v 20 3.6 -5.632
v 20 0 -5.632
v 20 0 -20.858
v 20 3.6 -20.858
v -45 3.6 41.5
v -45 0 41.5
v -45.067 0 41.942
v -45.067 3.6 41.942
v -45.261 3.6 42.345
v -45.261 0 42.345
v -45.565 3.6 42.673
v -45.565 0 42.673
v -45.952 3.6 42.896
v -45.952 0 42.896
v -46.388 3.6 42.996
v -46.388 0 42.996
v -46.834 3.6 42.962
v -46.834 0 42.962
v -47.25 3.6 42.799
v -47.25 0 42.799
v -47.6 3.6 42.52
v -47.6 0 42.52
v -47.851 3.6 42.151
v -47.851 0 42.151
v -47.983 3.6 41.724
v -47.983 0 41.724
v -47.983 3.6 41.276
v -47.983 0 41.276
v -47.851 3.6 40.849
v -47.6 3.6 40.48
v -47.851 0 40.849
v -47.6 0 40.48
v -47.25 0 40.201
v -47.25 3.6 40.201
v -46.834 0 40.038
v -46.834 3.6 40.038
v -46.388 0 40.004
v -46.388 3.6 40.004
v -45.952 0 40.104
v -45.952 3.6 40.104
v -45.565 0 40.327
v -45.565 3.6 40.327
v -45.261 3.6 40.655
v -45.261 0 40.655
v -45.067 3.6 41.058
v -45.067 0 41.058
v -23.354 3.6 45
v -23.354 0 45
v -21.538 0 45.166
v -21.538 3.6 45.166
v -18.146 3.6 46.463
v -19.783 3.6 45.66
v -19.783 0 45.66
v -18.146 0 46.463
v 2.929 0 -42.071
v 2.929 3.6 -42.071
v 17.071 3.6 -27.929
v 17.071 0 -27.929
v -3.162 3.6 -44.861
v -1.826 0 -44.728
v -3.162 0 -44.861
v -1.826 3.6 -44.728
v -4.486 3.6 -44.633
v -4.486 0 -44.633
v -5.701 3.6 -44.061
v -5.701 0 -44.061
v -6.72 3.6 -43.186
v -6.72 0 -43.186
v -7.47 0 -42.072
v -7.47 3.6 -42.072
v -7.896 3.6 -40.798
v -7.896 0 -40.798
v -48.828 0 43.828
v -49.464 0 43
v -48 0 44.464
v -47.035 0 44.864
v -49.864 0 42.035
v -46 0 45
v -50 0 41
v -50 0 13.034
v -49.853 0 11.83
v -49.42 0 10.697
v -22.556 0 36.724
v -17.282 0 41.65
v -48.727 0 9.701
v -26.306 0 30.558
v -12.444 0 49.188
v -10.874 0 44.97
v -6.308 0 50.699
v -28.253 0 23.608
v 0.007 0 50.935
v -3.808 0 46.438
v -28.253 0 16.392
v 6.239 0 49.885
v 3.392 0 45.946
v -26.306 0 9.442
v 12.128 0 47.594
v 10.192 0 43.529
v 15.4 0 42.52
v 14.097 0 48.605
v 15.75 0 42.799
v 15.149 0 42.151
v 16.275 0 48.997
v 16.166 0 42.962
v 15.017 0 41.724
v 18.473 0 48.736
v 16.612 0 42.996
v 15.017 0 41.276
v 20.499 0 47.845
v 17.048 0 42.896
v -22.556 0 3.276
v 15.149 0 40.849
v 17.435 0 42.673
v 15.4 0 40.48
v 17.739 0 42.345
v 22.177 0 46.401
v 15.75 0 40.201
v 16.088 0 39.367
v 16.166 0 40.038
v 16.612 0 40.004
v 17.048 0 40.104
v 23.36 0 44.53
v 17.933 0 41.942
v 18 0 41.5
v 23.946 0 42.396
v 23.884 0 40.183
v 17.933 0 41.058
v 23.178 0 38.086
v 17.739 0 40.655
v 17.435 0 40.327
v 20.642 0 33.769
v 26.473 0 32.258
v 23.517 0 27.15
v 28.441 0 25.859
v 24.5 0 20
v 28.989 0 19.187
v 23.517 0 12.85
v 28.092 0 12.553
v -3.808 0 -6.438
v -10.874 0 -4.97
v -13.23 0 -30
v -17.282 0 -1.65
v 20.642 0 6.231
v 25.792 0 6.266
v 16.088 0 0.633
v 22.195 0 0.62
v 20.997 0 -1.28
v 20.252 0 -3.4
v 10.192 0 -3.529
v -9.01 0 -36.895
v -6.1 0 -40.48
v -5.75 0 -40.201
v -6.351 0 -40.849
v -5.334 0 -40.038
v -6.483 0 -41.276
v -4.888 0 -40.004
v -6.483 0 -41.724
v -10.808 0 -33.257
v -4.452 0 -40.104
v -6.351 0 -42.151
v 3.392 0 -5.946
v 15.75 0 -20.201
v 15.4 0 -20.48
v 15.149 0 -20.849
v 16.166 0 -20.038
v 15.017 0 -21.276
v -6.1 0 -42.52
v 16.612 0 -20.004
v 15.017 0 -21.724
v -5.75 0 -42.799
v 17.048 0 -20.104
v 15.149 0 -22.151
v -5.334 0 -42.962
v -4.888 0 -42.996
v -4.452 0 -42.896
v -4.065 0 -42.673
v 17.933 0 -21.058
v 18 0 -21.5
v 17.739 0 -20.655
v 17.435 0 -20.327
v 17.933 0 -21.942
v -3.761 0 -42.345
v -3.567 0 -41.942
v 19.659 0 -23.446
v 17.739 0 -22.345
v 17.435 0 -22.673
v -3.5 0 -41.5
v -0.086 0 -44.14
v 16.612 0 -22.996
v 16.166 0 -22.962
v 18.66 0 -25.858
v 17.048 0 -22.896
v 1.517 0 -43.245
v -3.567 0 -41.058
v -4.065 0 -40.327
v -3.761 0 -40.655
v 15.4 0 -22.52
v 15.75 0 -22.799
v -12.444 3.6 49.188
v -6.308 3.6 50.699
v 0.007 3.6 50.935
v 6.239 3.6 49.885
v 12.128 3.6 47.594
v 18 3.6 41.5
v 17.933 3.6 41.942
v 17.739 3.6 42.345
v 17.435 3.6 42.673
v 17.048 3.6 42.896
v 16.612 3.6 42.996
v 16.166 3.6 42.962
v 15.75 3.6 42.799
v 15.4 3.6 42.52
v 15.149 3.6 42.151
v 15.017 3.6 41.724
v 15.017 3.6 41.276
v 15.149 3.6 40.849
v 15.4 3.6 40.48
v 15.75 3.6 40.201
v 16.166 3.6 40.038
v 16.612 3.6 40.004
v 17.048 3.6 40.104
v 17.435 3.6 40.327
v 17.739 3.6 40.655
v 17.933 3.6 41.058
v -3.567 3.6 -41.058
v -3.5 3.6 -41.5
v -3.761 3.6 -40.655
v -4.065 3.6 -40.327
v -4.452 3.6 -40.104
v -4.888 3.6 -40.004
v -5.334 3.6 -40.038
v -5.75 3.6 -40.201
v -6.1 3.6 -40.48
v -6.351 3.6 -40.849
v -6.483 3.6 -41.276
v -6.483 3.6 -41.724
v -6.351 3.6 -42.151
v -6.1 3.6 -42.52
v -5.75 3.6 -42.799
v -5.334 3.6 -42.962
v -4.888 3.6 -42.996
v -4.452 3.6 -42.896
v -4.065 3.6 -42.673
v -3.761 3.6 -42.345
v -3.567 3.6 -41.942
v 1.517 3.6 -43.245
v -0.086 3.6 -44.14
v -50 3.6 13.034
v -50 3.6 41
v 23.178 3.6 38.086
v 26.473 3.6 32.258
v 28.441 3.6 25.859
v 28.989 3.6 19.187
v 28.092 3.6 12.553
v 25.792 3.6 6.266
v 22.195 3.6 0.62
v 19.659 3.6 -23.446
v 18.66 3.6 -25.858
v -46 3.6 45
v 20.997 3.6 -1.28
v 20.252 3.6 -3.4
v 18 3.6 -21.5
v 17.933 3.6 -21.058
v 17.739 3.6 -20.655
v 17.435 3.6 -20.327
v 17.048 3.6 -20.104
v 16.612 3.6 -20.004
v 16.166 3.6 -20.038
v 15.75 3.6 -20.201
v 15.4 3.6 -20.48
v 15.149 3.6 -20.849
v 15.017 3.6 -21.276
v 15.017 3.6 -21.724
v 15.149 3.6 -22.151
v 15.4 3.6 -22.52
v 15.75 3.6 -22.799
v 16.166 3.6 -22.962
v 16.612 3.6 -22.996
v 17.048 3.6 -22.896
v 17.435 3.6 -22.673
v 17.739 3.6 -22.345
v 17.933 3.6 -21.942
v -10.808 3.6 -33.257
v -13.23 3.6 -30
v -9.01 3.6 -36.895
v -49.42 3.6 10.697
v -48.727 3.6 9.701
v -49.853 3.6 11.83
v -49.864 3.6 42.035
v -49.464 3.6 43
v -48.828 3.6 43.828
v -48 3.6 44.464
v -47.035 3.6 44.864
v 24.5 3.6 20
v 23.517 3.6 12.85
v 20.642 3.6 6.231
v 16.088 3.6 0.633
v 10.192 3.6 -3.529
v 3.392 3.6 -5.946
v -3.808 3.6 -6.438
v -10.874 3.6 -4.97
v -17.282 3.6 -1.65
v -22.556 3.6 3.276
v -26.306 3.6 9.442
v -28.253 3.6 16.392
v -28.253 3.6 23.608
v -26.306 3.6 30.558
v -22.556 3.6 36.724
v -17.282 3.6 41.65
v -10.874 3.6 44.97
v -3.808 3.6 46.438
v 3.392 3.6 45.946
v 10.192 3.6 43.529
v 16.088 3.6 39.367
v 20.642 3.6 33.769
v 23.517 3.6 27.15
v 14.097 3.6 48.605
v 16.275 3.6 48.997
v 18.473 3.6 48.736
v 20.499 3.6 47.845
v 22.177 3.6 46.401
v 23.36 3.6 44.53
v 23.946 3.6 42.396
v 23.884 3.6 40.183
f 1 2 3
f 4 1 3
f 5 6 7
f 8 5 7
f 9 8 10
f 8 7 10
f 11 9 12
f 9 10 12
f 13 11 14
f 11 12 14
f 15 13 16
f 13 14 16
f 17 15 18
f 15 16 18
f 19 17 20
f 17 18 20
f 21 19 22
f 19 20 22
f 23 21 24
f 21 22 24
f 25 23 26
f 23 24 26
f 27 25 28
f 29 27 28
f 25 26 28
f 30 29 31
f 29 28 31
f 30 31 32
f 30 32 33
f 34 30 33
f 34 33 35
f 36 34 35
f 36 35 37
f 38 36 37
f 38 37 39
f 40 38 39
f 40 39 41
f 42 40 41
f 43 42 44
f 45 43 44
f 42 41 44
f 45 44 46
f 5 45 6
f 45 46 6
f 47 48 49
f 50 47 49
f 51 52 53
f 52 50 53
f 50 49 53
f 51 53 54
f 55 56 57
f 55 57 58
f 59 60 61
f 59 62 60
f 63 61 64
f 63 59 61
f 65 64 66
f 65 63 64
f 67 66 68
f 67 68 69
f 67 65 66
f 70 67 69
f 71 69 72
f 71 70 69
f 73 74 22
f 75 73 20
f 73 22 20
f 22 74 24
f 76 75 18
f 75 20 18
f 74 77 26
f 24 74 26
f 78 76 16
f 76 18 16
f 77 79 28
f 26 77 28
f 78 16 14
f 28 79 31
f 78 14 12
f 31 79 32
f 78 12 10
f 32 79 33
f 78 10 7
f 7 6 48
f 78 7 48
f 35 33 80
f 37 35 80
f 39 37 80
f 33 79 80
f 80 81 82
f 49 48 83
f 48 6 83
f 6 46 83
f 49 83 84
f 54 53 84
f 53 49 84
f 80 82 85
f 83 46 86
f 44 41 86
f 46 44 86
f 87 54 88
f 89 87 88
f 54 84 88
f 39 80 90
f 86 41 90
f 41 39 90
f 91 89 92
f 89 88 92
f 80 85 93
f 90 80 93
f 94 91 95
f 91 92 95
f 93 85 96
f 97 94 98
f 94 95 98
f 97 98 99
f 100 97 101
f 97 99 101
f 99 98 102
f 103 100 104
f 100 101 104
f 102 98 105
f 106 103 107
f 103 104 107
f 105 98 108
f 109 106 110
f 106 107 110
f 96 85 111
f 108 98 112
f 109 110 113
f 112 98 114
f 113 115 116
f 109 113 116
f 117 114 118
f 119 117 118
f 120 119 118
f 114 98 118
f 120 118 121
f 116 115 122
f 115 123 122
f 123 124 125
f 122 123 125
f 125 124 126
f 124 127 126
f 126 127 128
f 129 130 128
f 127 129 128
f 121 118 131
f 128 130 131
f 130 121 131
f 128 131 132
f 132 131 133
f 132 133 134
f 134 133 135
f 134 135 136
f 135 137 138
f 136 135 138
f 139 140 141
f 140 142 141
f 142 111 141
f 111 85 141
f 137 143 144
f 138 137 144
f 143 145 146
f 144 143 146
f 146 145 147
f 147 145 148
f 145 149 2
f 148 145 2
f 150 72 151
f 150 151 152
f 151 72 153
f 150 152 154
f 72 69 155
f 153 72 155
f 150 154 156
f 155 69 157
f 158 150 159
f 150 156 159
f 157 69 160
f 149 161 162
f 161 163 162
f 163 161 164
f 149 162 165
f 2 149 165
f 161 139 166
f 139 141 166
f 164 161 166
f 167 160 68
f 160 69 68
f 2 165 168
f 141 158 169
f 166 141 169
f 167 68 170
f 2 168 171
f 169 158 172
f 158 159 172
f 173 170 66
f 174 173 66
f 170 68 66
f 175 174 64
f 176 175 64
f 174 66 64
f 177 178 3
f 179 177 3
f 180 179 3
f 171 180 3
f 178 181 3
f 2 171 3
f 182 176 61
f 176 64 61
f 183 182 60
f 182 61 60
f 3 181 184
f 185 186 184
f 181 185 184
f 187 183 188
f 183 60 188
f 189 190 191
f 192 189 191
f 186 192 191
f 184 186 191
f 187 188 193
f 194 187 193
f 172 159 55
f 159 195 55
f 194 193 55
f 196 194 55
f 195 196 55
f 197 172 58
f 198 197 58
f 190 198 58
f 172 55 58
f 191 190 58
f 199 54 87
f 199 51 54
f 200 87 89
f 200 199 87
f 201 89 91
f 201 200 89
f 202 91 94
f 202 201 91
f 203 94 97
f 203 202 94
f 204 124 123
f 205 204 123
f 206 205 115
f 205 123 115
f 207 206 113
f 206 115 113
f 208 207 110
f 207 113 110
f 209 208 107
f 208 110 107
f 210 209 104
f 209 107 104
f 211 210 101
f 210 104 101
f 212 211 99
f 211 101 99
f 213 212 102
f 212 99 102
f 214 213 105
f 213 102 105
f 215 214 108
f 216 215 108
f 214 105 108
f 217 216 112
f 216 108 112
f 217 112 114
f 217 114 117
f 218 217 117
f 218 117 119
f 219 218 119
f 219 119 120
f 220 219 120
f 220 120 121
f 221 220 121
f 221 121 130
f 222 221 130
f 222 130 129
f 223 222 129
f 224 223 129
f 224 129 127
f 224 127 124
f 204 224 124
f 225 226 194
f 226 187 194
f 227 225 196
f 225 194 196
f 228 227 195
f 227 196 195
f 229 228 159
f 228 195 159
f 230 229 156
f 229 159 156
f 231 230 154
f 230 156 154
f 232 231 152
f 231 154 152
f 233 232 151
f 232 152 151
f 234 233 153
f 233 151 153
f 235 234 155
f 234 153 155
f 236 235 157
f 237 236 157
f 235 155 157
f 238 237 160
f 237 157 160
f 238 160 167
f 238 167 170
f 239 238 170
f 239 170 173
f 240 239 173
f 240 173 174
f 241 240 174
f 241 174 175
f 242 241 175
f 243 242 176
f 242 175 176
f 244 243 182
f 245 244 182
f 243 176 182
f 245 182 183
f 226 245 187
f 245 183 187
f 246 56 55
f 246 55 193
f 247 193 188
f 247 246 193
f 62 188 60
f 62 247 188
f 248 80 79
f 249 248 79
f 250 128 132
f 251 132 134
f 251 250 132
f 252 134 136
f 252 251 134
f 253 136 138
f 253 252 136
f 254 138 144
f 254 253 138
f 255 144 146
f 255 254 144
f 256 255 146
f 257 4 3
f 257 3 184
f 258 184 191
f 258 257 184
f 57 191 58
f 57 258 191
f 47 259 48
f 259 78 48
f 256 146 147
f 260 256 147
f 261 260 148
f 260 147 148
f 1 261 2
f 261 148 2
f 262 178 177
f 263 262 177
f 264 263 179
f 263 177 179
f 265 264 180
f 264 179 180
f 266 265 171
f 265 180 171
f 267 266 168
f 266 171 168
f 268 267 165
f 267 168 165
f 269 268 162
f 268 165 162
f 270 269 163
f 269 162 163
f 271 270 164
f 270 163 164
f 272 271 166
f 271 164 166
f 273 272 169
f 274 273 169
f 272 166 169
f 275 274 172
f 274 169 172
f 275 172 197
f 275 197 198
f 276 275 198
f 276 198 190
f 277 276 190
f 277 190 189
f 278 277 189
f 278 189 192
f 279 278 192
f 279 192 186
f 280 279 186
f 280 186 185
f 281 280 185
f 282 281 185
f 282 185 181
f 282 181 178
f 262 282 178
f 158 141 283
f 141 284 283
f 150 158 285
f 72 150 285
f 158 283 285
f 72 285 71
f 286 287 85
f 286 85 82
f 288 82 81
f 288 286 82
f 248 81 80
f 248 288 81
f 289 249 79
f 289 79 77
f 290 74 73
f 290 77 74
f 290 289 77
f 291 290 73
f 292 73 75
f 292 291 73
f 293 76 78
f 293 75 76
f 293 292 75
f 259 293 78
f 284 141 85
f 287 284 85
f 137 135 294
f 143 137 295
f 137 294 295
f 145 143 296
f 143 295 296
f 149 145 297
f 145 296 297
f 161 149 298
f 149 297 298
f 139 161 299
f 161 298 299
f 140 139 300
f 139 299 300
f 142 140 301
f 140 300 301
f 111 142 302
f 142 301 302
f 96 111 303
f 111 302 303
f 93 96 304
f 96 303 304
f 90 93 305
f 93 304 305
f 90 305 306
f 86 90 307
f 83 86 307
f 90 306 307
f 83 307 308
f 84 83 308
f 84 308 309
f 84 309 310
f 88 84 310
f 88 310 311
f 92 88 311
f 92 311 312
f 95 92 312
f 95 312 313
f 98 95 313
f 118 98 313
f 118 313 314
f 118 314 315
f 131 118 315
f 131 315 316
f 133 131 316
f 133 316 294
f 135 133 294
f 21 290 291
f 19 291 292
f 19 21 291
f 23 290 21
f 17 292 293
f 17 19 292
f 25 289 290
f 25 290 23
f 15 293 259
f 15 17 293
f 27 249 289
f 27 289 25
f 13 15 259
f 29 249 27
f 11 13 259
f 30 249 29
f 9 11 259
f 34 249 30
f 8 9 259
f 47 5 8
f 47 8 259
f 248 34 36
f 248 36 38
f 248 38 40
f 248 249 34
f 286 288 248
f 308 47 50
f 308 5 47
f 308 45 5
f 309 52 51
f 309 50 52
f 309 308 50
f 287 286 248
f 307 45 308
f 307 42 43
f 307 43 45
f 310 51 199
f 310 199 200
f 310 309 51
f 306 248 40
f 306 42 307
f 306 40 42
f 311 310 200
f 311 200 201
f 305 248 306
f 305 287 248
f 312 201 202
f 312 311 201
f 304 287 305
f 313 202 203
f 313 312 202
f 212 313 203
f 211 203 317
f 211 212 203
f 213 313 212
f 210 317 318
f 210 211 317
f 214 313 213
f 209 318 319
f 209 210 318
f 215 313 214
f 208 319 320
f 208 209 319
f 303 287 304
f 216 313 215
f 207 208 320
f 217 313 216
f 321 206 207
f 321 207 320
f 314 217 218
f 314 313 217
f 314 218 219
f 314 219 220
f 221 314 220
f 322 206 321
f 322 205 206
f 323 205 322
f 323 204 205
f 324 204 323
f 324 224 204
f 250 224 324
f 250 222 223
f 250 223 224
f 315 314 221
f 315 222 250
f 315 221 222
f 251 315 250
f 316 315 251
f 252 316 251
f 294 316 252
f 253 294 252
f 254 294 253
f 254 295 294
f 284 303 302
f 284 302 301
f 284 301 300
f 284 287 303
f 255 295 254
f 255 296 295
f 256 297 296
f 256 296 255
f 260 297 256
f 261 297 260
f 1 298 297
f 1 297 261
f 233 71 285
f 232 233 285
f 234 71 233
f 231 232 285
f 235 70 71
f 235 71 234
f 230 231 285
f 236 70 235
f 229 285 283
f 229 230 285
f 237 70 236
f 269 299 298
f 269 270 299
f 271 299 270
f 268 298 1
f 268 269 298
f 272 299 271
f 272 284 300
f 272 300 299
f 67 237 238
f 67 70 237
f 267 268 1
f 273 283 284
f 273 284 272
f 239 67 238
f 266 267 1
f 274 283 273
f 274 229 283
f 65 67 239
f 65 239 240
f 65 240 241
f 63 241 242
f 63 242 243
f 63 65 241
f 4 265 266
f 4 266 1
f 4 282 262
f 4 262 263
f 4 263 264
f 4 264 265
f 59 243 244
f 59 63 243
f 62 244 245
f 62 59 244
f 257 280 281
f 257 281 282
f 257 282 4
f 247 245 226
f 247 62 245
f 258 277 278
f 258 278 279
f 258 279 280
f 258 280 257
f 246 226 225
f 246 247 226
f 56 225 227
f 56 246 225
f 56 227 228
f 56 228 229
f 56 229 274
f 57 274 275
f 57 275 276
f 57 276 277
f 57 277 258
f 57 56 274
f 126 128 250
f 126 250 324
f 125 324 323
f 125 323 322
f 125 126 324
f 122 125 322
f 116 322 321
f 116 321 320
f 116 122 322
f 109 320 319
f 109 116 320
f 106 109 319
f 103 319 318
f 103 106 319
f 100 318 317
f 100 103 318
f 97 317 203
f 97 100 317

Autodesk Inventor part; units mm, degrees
ref_plane "YZ Plane" through (0, 0, 0) normal (1, 0, 0) x (0, 1, 0)
ref_plane "XZ Plane" through (0, 0, 0) normal (0, 1, 0) x (-1, 0, 0)
ref_plane "XY Plane" through (0, 0, 0) normal (0, 0, 1) x (1, 0, 0)
sketch "Sketch1" plane through (0, 0, 0) normal (0, 1, 0) x (-1, 0, 0)
  line L0 (20, 45) -> (-20, 45)
  line L1 (-20, 45) -> (-20, -45)
  line L2 (-20, -45) -> (20, -45)
  line L3 (20, -45) -> (20, 45)
  line L4 (20, 45) -> (-20, -45) construction
  line L5 (-20, 45) -> (20, -45) construction
  line L6 (20, -45) -> (50, -45)
  line L7 (50, -45) -> (50, 45)
  line L8 (50, 45) -> (20, 45)
  line L9 (20, 45) -> (20, -45)
  point P0 (0, 0)
  dimension "d0" = 40
  dimension "d1" = 90
  dimension "d7" = 30
  dimension "d8" = 90
extrude "Extrusion1" add sketch "Sketch1" along normal blind 3.6
sketch "Sketch3" plane through (0, 3.6, 0) normal (0, 1, 0) x (1, 0, 0)
  line L0 (-50, 45) -> (-50, -45) projected
  circle A0 centre (-30, 45) radius 22.5
  point P0 (0, 0)
  point P1 (20, 45)
  dimension "d37" = 20
  dimension "d38" = 45
extrude "Extrusion3" cut sketch "Sketch3" against normal blind 10
fillet "Fillet2" radius 4 3 edges at (-50, 1.8, 45) (20, 1.8, 45) (-50, 1.8, -34.6922)
chamfer "Chamfer1" distance 20 angle 45 1 edges at (20, 1.8, -45)
fillet "Fillet4" radius 10 2 edges at (0, 1.8, -45) (20, 1.8, -25)
fillet "Fillet5" radius 5 1 edges at (-7.5, 1.8, -45)
sketch "Sketch9" plane through (0, 0, 0) normal (0, -1, 0) x (1, 0, 0)
  circle A0 centre (-46.5, 41.5) radius 1.5
  line L0 (-46, 45) -> (16, 45) projected
  line L1 (-50, -23.8754) -> (-50, 41) projected
  arc A1 (-50, -23.8754) -> (-43.5849, -27.064) centre (-46, -23.8754) ccw projected
  point P0 (0, 0)
  dimension "d70" = 3
  dimension "d72" = 3.5
  dimension "d73" = 3.5
extrude "Extrusion9" cut sketch "Sketch9" against normal blind 10
sketch "Sketch4" plane through (0, 3.6, 0) normal (0, 1, 0) x (1, 0, 0)
  circle A0 centre (-2, -20) radius 31
  line L0 (20, -41) -> (20, 45) projected
  line L1 (-46, -45) -> (16, -45) projected
  point P0 (0, 0)
  point P1 (20, 23.8754)
  dimension "d14" = 62
  dimension "d15" = 22
  dimension "d16" = 25
extrude "Extrusion4" add sketch "Sketch4" against normal blind 3.6
sketch "Sketch12" plane through (0, 3.6, 0) normal (0, 1, 0) x (1, 0, 0)
  arc A0 (19.8839, -41.9566) -> (20, 1.8403) centre (-2, -20) ccw projected
  circle A1 centre (-2, -20) radius 26.5
  point P0 (0, 0)
  dimension "d95" = 53
extrude "Extrusion12" cut sketch "Sketch12" against normal blind 10
fillet "Fillet8" radius 10 2 edges at (-20.3303, 1.8, 45) (20, 1.8, -1.8403)
sketch "Sketch7" plane through (-32.64, 0, 1.0706) normal (0, -1, 0) x (1, 0, 0)
  circle A0 centre (27.64, -42.5706) radius 1.5
  circle A1 centre (49.14, -22.5706) radius 1.5
  circle A2 centre (49.14, 40.4294) radius 1.5
  line L0 (25.8579, -46.0706) -> (23.6643, -46.0706)
  line L1 (52.64, 41) -> (52.64, -20.8579)
  line L2 (-20, -45) -> (-20, 41)
  line L3 (-16, 43.9294) -> (46, 43.9294)
  line L4 (-13.36, 43.9294) -> (48.64, 43.9294) projected
  line L5 (52.64, 39.9294) -> (52.64, -21.9285) projected
  point P0 (0, 0)
  dimension "d56" = 3
  dimension "d53" = 3
  dimension "d50" = 3
  dimension "d58" = 3.5
  dimension "d55" = 3.5
  dimension "d57" = 25
  dimension "d54" = 20
  dimension "d52" = 3.5
  dimension "d51" = 3.5
  dimension "d62" = 0
  dimension "d63" = 0
  dimension "d79" = 90
extrude "Extrusion7" cut sketch "Sketch7" against normal blind 10
sketch "Sketch13" plane through (0, 0, 0) normal (0, -1, 0) x (1, 0, 0)
  circle A0 centre (16.5, 41.5) radius 1.5 projected
  arc A1 (19.9534, 34.8424) -> (9.4018, 43.9217) centre (16.5, 41.5) ccw
  circle A2 centre (-2, 20) radius 26.5 projected
  circle A3 centre (-2, 20) radius 26.5
  circle A4 centre (16.5, 41.5) radius 2.7131
  point P0 (0, 0)
  dimension "d97" = 15
extrude "Extrusion13" add sketch "Sketch13" against normal blind 3.6 contours A2 A4 A1 | A2 A4 picked at (14.5458, 40.9715)
sketch "Sketch14" plane through (0, 0, 0) normal (0, -1, 0) x (1, 0, 0)
  arc A0 (-7.8959, -40.7978) -> (-43.5849, -27.064) centre (-30, -45) ccw projected
  line L0 (-13.2295, -30) -> (-50, 11.1246)
  line L1 (-50, -23.8754) -> (-50, 41) projected
  line L2 (-50, 11.1246) -> (-50, -45)
  line L3 (-50, -45) -> (-13.2295, -30)
  point P0 (0, 0)
  dimension "d100" = 35
  dimension "d101" = 15
extrude "Extrusion14" cut sketch "Sketch14" against normal blind 3.6
fillet "Fillet9" radius 5 1 edges at (-50, 1.8, 11.1246)
properties part number "p1"
